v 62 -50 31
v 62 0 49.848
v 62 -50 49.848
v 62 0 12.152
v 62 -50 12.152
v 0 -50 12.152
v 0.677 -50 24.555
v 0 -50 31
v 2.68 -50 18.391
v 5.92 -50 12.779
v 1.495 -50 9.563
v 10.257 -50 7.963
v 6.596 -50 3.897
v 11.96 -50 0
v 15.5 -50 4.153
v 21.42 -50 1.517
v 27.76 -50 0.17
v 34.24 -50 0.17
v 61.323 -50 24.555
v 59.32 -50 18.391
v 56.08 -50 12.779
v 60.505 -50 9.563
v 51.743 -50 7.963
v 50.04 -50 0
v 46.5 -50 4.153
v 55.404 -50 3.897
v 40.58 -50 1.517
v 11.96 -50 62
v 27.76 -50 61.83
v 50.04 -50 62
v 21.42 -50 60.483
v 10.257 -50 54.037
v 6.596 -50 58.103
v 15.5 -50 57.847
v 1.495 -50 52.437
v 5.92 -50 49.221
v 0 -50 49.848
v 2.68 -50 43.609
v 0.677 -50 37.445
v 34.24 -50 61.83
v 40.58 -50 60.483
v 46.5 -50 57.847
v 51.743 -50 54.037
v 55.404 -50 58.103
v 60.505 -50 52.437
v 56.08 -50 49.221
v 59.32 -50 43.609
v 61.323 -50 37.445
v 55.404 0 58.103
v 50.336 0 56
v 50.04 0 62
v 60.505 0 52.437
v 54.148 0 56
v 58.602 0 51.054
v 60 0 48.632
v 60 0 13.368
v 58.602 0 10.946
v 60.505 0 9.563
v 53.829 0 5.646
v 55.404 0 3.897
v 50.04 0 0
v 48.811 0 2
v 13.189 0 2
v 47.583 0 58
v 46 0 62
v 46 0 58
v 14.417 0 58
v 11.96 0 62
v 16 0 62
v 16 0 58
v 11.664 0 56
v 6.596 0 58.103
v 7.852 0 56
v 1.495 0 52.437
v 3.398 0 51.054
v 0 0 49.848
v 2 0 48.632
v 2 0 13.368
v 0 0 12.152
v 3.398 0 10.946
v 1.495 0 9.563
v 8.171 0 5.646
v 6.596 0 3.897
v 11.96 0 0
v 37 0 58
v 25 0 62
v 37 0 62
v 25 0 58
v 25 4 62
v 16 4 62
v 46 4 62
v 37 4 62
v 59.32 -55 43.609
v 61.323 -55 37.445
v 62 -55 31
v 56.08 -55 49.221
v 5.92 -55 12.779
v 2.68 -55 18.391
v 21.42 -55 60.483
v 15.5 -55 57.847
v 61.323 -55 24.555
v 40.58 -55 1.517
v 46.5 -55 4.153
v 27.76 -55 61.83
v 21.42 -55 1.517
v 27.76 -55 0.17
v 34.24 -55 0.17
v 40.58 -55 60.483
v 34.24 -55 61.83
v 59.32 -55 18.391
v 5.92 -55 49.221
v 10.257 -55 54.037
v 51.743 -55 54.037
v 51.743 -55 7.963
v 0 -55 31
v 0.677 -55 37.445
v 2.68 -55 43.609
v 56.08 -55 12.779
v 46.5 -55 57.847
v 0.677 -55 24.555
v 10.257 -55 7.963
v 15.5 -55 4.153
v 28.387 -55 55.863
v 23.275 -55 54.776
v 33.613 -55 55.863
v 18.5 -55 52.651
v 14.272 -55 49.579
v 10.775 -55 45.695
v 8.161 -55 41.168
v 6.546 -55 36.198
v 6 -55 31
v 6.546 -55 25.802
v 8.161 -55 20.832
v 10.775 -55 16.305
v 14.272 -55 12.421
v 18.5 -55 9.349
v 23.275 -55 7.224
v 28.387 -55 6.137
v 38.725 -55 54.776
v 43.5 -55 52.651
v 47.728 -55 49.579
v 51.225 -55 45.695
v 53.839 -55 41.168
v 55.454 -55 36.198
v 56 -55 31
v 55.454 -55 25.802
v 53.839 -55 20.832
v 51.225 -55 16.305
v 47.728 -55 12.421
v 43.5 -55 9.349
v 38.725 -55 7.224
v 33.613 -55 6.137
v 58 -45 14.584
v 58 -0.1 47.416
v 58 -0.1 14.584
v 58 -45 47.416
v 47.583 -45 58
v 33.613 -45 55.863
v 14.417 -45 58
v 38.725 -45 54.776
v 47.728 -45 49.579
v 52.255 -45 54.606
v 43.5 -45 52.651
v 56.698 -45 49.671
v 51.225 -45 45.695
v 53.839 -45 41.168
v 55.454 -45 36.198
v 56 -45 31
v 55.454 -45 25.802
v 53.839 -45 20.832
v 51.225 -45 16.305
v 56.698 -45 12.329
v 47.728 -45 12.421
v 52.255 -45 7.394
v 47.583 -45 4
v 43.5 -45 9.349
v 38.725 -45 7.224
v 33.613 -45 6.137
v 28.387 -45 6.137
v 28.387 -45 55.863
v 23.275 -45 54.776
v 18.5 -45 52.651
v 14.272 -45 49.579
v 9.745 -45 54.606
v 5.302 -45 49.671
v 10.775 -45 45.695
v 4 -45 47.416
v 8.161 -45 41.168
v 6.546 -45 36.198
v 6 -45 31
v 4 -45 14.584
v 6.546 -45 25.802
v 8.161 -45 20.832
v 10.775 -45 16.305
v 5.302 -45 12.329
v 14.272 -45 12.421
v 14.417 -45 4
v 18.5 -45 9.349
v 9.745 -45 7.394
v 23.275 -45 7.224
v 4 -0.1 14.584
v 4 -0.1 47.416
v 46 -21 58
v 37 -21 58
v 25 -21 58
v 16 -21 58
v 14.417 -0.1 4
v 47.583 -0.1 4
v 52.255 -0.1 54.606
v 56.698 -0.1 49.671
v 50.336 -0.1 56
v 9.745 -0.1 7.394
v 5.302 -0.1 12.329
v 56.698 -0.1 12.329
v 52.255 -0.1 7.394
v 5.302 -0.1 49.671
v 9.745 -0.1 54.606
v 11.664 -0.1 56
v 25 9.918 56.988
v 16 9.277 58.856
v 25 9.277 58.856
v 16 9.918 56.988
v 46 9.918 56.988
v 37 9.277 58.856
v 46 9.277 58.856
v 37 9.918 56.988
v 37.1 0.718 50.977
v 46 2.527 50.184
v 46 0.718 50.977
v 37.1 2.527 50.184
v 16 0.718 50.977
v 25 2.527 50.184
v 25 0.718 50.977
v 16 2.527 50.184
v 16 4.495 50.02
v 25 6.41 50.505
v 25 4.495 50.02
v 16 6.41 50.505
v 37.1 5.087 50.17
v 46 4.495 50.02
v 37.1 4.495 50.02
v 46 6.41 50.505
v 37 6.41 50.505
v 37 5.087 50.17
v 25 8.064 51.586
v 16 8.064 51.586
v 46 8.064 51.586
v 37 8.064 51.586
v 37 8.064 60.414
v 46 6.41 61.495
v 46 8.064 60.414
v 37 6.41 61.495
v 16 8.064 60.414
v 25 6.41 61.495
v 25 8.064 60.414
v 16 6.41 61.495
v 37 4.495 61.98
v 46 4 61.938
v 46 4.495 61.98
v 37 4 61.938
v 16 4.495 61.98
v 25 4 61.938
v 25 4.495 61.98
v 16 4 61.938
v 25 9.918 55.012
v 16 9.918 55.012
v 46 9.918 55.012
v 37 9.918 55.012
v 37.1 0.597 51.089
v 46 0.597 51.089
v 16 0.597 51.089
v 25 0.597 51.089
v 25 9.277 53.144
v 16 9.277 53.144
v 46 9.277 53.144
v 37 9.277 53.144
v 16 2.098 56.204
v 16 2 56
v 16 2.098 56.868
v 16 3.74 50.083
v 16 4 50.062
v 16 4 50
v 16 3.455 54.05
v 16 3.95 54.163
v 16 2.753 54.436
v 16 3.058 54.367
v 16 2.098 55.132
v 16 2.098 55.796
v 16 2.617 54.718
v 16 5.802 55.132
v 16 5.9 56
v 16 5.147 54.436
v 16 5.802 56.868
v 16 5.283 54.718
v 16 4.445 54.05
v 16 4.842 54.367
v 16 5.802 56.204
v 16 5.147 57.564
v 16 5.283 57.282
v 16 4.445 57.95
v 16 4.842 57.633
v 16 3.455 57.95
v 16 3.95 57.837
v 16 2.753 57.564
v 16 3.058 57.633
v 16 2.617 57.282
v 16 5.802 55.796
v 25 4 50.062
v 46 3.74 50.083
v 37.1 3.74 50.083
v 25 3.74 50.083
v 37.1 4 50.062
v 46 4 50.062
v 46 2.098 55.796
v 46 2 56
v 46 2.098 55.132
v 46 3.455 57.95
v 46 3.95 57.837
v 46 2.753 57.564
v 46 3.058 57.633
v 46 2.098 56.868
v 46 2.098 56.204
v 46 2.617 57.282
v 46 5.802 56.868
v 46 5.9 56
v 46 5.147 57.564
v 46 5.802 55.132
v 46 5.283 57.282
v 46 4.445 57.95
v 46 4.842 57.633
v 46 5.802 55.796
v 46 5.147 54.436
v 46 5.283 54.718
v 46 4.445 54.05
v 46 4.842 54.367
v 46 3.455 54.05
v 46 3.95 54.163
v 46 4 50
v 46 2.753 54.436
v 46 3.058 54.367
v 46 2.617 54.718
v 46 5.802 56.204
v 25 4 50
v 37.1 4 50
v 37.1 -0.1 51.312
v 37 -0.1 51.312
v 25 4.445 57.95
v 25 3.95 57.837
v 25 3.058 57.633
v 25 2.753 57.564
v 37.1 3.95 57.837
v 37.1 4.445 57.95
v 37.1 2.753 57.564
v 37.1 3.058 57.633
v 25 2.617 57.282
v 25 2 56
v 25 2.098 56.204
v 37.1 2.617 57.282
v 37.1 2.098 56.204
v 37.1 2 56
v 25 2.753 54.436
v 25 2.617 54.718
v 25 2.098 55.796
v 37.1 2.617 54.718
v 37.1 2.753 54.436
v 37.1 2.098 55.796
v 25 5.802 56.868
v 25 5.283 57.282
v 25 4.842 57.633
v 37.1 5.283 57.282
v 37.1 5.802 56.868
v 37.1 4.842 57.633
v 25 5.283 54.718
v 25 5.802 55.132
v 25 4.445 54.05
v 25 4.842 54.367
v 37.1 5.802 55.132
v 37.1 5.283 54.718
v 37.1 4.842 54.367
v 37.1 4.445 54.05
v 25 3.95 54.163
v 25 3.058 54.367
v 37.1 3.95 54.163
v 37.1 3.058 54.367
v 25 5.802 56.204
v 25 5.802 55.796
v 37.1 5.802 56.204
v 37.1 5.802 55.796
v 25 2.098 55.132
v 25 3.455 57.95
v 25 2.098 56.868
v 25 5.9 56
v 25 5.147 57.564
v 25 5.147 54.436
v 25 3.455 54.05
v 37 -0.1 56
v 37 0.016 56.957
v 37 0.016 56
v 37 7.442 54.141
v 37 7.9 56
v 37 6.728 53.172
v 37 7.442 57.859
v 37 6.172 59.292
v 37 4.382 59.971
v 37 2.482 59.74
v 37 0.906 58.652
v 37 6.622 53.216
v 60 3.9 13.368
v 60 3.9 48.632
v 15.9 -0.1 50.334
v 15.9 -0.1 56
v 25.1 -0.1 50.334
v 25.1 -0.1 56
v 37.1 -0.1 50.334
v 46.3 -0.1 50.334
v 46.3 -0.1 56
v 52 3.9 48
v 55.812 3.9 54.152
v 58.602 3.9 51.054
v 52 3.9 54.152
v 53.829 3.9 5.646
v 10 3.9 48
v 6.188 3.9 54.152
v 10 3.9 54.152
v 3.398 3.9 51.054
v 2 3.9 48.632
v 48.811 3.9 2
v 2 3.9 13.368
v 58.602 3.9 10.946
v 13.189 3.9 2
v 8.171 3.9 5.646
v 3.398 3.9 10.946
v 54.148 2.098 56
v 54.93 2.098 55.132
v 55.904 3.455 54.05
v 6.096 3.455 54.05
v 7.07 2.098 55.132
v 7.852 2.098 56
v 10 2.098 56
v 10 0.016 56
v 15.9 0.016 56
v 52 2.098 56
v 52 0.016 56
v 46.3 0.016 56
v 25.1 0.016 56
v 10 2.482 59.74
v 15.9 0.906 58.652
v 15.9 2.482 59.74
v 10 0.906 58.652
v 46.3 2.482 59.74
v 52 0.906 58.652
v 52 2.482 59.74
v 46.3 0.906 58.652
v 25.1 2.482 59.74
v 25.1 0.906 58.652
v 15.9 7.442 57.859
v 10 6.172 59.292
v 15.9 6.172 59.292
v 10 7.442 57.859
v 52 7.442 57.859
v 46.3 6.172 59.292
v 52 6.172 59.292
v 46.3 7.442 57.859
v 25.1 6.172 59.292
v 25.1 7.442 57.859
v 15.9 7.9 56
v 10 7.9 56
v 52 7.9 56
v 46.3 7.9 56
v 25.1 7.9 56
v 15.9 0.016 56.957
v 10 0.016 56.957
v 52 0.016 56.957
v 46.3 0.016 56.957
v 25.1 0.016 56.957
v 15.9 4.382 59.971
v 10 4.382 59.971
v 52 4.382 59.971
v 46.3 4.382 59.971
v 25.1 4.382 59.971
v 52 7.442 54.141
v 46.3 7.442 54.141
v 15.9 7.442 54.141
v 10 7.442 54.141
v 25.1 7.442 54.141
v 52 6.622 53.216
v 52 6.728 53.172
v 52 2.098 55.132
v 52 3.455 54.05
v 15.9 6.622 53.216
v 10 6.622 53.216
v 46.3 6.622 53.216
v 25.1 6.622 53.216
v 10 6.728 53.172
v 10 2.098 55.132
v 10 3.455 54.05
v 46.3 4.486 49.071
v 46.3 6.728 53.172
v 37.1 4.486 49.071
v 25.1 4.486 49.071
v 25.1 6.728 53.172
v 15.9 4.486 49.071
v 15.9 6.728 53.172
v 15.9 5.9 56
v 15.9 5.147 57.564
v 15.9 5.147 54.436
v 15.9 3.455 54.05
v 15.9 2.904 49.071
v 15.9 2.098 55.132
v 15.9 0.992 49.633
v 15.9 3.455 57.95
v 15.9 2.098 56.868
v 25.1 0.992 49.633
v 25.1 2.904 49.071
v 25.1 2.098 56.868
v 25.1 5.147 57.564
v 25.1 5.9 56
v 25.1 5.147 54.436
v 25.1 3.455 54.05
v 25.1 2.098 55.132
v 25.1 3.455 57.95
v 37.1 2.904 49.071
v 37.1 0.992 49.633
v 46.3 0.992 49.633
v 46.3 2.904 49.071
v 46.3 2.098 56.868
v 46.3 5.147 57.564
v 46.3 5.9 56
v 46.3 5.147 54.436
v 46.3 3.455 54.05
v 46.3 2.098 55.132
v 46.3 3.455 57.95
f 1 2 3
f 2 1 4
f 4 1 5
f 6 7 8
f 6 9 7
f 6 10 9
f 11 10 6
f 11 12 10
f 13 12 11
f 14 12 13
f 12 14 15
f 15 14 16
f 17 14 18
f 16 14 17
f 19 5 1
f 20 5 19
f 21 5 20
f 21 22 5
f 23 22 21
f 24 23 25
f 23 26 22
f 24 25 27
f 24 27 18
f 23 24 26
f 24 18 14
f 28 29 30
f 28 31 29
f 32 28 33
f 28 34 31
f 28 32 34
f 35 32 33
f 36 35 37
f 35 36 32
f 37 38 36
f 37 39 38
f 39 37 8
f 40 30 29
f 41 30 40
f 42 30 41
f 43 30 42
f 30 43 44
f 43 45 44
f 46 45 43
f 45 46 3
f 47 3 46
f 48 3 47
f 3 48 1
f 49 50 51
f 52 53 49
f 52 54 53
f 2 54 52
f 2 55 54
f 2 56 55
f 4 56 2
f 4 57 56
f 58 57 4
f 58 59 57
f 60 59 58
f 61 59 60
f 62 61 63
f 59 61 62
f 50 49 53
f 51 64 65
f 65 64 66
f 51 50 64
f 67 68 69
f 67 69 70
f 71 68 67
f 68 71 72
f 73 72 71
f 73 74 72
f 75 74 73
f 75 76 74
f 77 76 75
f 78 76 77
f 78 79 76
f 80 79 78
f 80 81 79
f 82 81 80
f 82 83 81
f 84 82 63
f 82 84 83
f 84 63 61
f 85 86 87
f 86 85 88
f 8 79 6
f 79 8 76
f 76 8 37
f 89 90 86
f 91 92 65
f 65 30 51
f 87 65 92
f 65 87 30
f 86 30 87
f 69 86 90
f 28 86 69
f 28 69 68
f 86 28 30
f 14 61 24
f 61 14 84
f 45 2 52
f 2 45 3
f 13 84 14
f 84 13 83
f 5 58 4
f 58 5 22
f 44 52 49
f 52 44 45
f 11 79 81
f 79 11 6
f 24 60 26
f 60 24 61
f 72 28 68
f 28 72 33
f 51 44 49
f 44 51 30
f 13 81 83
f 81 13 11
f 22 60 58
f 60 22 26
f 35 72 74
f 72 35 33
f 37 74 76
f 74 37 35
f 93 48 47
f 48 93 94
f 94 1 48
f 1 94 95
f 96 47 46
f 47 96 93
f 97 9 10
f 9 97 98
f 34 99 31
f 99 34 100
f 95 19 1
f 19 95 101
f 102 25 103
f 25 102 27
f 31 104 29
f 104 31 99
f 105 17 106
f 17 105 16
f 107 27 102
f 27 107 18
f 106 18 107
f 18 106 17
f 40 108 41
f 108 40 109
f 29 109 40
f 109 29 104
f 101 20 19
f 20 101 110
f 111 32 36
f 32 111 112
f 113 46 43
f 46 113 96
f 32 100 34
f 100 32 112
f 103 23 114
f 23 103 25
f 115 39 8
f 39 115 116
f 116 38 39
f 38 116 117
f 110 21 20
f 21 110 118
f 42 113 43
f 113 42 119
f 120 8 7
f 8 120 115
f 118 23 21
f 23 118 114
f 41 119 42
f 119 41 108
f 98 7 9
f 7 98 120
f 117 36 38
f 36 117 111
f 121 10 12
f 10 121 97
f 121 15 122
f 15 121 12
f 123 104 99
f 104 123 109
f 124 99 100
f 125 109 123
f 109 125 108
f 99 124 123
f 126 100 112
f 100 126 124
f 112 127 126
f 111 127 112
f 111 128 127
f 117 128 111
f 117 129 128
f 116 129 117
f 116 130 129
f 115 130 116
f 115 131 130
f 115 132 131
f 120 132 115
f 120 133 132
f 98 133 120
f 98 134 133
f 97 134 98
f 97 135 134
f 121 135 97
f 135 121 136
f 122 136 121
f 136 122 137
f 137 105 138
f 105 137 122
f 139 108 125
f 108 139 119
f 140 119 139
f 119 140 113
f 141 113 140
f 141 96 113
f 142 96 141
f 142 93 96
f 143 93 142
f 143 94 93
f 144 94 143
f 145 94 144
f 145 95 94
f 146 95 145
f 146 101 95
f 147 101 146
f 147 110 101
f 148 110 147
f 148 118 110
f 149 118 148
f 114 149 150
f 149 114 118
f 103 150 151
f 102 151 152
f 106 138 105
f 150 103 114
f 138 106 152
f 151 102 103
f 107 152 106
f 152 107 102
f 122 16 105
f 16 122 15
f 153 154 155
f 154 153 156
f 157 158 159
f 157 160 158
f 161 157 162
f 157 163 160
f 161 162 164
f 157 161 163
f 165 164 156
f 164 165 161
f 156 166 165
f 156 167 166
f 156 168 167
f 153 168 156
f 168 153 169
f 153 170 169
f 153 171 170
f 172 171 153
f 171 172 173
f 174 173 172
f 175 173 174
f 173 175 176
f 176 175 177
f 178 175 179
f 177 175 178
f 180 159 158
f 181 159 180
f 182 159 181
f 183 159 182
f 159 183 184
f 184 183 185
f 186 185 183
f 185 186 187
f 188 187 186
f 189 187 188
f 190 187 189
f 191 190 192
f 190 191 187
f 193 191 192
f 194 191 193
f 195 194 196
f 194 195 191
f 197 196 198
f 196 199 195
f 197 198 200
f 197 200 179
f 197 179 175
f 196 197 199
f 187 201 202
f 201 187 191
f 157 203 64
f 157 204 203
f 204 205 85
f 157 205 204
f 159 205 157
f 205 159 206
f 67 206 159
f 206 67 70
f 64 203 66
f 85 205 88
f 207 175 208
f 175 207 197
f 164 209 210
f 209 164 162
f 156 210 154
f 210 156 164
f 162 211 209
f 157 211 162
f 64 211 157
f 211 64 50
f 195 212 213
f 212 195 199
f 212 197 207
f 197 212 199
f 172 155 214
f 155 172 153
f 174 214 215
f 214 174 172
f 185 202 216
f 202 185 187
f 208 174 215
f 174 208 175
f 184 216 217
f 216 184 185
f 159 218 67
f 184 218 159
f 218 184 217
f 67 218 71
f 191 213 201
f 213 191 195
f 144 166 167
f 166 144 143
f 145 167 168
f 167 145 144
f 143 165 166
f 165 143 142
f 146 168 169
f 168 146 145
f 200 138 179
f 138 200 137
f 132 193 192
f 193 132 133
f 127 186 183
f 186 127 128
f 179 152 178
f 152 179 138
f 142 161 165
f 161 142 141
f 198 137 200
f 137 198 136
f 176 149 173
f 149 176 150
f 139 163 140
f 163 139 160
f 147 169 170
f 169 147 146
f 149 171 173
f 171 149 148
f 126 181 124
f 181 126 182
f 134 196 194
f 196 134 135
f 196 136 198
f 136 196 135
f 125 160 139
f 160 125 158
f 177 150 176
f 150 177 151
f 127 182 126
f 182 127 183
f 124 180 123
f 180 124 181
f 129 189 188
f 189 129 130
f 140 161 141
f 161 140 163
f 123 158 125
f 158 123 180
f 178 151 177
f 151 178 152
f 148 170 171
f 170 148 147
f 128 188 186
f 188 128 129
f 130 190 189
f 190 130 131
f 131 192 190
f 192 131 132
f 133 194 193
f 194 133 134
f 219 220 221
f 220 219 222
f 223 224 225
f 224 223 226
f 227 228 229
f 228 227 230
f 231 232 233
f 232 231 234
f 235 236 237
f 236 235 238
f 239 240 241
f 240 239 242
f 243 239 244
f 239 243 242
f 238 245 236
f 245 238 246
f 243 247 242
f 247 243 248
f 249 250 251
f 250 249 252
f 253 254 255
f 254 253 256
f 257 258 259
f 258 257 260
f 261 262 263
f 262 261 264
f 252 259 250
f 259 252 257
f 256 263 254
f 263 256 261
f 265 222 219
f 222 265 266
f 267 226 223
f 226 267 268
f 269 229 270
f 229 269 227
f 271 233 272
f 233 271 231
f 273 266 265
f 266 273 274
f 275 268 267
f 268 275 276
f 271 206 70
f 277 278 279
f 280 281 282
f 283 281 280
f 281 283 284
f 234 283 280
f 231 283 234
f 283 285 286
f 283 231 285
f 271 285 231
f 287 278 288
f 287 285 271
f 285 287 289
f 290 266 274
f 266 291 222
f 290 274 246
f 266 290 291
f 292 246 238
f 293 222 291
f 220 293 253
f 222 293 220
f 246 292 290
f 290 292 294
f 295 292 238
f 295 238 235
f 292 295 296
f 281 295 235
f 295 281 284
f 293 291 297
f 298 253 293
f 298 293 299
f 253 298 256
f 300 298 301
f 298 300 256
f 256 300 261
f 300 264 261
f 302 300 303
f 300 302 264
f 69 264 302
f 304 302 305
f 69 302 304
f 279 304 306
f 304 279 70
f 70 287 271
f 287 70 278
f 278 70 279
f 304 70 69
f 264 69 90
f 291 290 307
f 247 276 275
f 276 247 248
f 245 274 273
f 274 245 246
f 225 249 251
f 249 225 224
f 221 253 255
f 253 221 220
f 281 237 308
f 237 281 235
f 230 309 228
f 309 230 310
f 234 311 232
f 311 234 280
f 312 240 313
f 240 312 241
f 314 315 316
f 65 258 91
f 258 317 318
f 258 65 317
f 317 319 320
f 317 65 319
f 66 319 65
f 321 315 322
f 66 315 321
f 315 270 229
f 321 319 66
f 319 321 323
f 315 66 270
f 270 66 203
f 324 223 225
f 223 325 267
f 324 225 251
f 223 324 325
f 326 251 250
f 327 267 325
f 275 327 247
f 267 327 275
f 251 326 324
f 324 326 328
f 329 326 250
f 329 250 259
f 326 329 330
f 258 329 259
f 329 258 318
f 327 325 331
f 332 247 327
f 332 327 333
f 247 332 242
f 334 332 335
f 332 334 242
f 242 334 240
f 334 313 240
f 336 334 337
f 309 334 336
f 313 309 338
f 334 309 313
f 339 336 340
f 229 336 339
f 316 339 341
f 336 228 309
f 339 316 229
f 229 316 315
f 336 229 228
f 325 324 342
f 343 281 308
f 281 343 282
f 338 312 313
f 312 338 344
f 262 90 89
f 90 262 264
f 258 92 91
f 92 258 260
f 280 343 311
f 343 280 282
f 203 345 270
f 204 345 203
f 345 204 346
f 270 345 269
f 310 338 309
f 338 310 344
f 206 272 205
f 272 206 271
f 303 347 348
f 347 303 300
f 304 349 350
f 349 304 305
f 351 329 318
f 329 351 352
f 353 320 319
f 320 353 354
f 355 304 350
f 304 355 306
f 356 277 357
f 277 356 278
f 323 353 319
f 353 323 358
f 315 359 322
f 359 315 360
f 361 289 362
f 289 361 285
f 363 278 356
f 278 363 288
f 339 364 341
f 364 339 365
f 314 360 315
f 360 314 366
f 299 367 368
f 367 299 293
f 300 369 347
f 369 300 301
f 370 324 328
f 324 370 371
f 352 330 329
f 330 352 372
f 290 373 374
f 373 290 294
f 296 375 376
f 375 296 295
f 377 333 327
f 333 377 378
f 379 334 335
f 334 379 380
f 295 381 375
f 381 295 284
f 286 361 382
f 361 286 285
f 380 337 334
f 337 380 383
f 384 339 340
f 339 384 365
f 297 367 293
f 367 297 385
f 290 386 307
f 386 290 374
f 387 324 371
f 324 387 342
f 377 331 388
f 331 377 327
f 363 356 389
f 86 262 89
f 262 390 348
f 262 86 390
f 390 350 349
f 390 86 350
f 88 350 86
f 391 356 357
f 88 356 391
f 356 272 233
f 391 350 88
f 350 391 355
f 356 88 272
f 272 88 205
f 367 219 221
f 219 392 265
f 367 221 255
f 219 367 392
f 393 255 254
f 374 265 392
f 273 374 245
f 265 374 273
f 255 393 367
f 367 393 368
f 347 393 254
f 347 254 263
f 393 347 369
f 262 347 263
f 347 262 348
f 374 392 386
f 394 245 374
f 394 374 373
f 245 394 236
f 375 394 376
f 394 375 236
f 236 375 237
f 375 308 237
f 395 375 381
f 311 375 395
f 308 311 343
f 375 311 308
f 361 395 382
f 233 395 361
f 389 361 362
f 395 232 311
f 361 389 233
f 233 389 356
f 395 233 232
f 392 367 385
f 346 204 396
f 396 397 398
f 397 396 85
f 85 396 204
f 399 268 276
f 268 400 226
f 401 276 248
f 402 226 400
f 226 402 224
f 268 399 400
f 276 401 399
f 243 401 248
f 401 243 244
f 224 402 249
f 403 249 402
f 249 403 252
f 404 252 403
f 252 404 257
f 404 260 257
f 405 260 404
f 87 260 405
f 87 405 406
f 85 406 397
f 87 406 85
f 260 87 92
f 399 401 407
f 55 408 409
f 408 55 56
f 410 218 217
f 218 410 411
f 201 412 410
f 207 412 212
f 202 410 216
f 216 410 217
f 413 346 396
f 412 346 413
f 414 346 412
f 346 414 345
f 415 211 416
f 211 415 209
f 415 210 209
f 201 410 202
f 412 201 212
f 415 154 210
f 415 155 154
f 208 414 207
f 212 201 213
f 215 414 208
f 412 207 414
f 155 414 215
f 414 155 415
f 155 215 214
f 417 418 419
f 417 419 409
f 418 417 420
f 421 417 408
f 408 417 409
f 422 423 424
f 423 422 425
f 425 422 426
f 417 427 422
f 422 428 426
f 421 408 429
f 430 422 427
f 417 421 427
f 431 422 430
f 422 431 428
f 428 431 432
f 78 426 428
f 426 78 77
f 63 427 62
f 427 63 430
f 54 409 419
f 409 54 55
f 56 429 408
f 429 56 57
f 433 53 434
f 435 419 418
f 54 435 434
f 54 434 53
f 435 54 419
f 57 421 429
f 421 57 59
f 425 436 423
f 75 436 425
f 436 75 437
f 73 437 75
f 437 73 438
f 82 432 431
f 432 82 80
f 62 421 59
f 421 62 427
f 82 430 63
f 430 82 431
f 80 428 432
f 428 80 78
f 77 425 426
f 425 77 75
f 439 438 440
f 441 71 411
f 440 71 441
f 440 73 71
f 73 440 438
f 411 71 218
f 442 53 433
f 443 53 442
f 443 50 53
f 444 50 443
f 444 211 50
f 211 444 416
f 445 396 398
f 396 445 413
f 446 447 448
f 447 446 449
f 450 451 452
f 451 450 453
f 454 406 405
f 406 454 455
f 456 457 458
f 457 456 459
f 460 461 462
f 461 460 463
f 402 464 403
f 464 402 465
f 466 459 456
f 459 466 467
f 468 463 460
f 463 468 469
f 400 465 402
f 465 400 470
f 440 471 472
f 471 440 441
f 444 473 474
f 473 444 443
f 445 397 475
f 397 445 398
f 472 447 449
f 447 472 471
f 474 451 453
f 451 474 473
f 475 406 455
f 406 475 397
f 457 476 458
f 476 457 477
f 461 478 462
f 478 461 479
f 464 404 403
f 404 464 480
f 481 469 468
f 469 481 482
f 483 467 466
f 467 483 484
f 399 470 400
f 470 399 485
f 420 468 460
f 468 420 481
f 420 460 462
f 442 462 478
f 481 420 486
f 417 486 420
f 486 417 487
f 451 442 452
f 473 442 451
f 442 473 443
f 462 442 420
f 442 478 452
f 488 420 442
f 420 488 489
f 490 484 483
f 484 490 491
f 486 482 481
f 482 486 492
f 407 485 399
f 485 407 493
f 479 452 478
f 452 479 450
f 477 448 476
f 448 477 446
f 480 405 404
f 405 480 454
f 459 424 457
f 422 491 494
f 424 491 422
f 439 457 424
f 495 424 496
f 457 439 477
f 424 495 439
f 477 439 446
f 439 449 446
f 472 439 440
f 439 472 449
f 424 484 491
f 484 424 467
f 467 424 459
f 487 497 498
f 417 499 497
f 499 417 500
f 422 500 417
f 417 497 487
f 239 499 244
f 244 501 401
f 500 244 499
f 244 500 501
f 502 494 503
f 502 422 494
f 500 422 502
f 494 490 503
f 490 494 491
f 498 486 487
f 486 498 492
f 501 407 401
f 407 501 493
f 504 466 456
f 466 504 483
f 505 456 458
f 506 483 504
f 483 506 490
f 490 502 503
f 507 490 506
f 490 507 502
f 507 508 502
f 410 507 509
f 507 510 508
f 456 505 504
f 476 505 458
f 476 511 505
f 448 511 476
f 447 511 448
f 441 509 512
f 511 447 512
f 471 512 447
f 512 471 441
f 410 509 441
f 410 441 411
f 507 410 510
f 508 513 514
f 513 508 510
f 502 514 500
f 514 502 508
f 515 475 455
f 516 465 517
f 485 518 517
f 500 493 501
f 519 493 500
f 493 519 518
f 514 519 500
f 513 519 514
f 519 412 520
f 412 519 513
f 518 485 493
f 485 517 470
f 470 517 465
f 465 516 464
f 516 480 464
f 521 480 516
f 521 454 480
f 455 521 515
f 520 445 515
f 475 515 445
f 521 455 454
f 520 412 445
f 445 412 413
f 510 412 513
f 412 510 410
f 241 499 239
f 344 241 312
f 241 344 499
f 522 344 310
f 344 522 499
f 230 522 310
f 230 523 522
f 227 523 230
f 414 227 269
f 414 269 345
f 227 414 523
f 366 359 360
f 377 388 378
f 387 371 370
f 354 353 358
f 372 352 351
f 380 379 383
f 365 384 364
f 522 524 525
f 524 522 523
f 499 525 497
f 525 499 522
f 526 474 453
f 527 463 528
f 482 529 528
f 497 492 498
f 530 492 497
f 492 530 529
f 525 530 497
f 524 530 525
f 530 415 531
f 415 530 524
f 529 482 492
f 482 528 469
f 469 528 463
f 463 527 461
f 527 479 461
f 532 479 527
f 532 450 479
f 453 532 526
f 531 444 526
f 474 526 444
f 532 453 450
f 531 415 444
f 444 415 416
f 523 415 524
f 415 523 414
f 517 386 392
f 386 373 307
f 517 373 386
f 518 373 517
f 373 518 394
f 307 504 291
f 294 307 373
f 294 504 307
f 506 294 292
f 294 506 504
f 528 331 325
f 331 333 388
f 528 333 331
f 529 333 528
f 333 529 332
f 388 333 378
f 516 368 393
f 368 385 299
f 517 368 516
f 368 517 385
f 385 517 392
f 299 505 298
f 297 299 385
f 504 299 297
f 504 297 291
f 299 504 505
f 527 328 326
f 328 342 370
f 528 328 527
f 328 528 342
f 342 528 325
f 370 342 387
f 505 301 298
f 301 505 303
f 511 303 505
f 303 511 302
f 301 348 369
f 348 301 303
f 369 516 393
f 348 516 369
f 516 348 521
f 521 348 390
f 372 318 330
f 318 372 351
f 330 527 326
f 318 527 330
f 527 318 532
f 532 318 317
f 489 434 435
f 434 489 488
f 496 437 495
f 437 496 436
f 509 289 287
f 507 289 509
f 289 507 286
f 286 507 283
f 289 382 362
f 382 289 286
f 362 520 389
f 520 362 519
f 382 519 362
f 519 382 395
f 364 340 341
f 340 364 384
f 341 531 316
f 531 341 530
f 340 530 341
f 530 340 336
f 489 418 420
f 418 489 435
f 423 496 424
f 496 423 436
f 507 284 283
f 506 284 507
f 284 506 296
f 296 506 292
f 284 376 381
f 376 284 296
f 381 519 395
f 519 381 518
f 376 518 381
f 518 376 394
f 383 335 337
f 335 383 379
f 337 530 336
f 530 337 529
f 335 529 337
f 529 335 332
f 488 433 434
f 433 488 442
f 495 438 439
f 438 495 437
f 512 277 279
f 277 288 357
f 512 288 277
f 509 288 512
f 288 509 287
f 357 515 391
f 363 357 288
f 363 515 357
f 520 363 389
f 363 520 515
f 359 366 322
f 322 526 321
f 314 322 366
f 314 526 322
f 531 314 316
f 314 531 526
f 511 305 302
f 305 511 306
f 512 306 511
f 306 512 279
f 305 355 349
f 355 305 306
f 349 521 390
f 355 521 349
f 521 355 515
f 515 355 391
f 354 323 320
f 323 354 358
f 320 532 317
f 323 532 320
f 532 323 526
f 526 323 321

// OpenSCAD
//
//  Copyright (C) 05-11-2012 Jasper den Ouden.
//
//  This is free software: you can redistribute it and/or modify
//  it under the terms of the GNU General Public License as published
//  by the Free Software Foundation, either version 3 of the License, or
//  (at your option) any later verssion.
//

plate_w = 4;
thread_d = 2;
thread_w = 5;

pot_r = 50/2;
top_w = 2*(pot_r + plate_w + thread_d);
Rf = 1.7;
top_R = top_w/Rf;
top_h  = 50;

hinge_d = 1.5*plate_w;
hinge_w = 1.5*hinge_d;

hinge_r = hinge_d/3;

space_d = plate_w/4;

module meh(r,w,h)
{ intersection()
    {   cube([w,w,h]);
        translate([w/2,w/2]) cylinder(r=r,h=h);
    }
}

module pot_top()
{ w = top_w;
  R = top_R;
  h = top_h;
  wi = w-2*plate_w;
  Ri = wi/Rf;
  difference()
  { union()
      { meh(R,w,h);
        translate([w/2,w/2,h]) 
            cylinder(r= pot_r + plate_w + thread_d, h=thread_w);
      }
    translate([plate_w,plate_w,-h]) meh(Ri,wi,2*h-thread_w);
    translate([w/2,w/2]) cylinder(r=pot_r, h=3*h);
        //TODO take out thread.
  }
}

module rcut(r,h)
{ difference()
    { cube([h,2*r,2*r]);
      rotate(a=90,v=[0,1,0]) cylinder(r=r, h = h);
    }
}

hinge_x = 4*plate_w;

module hinged_pot_hinge()
{ w = top_w;
  h = w-2*hinge_x;
  d = hinge_d;
  difference()
  { union()
      { cylinder(r=d,h=h);
        linear_extrude(height=h) 
            polygon([[0,-d], [0,d], [top_h/2,d], [top_h/2,d-plate_w]]);
      }
    translate([0,0,-top_h]) cylinder(r= hinge_r, h = 3*top_h);
    translate([-h,-h,hinge_w]) cube([3*h,3*h,h-2*hinge_w]);
  }  
}

module hinged_pot_top()
{ w = top_w;
  R = top_R;
  d= plate_w;
  difference()
  { pot_top();
//    translate([-w, w-4*d,-d]) cube([3*w, w,3*d]);
    
  }
  translate([w-2*hinge_x/2,w-hinge_d,-d]) rotate(v=[0,1,0], a=-90)
      hinged_pot_hinge();
}

rotate(v=[1,0,0],a=90) hinged_pot_top();

s=0.1;

module hinged_pot_lid()
{ w = top_w-plate_w;
    d = hinge_d;
    x = hinge_x-plate_w/2;
    translate([plate_w/2,0]) difference()
    { union()
        { translate([0,plate_w-w]) difference() 
            { meh(w/Rf, w, plate_w);
              translate([-w,w-d+plate_w/2,-plate_w]) 
                  cube([3*w, 2*d, 3*plate_w]);
            }
            translate([x-d,0]) 
                rotate(a=90, v=[0,1,0])
            { cylinder(r=plate_w, h=w-2*x+2*d);
              linear_extrude(height=w-2*x+2*d) 
                  polygon([[-plate_w,0], [plate_w,-plate_w]/sqrt(2),
                           [0,-2*plate_w]]);
            }
        }
        translate([x-s,0]) 
            rotate(a=90, v=[0,1,0]) cylinder(r=hinge_d+space_d, 
                                             h=hinge_w+2*s);
        translate([w-x-hinge_w+s,0]) 
            rotate(a=90, v=[0,1,0]) cylinder(r=hinge_d+space_d, 
                                             h=hinge_w+2*s);
        translate([plate_w/2+x-d-w,0]) 
            rotate(a=90, v=[0,1,0]) cylinder(r=hinge_r, h=4*w);
    }
}

module hinged_pot_axis()
{ w = top_w-plate_w;
  d = hinge_d;
  x = hinge_x-plate_w/2;
  translate([x-d+plate_w/2,0]) rotate(a=90,v=[0,1,0]) 
      cylinder(r=hinge_r, h=w-2*x+2*d); 
}

color([0,0,1]) translate([0,plate_w-s,top_w-hinge_d]) 
rotate(v=[1,0,0],a=90+90*$t) union()
{ hinged_pot_lid();
  color([1,0,0])hinged_pot_axis();
}
